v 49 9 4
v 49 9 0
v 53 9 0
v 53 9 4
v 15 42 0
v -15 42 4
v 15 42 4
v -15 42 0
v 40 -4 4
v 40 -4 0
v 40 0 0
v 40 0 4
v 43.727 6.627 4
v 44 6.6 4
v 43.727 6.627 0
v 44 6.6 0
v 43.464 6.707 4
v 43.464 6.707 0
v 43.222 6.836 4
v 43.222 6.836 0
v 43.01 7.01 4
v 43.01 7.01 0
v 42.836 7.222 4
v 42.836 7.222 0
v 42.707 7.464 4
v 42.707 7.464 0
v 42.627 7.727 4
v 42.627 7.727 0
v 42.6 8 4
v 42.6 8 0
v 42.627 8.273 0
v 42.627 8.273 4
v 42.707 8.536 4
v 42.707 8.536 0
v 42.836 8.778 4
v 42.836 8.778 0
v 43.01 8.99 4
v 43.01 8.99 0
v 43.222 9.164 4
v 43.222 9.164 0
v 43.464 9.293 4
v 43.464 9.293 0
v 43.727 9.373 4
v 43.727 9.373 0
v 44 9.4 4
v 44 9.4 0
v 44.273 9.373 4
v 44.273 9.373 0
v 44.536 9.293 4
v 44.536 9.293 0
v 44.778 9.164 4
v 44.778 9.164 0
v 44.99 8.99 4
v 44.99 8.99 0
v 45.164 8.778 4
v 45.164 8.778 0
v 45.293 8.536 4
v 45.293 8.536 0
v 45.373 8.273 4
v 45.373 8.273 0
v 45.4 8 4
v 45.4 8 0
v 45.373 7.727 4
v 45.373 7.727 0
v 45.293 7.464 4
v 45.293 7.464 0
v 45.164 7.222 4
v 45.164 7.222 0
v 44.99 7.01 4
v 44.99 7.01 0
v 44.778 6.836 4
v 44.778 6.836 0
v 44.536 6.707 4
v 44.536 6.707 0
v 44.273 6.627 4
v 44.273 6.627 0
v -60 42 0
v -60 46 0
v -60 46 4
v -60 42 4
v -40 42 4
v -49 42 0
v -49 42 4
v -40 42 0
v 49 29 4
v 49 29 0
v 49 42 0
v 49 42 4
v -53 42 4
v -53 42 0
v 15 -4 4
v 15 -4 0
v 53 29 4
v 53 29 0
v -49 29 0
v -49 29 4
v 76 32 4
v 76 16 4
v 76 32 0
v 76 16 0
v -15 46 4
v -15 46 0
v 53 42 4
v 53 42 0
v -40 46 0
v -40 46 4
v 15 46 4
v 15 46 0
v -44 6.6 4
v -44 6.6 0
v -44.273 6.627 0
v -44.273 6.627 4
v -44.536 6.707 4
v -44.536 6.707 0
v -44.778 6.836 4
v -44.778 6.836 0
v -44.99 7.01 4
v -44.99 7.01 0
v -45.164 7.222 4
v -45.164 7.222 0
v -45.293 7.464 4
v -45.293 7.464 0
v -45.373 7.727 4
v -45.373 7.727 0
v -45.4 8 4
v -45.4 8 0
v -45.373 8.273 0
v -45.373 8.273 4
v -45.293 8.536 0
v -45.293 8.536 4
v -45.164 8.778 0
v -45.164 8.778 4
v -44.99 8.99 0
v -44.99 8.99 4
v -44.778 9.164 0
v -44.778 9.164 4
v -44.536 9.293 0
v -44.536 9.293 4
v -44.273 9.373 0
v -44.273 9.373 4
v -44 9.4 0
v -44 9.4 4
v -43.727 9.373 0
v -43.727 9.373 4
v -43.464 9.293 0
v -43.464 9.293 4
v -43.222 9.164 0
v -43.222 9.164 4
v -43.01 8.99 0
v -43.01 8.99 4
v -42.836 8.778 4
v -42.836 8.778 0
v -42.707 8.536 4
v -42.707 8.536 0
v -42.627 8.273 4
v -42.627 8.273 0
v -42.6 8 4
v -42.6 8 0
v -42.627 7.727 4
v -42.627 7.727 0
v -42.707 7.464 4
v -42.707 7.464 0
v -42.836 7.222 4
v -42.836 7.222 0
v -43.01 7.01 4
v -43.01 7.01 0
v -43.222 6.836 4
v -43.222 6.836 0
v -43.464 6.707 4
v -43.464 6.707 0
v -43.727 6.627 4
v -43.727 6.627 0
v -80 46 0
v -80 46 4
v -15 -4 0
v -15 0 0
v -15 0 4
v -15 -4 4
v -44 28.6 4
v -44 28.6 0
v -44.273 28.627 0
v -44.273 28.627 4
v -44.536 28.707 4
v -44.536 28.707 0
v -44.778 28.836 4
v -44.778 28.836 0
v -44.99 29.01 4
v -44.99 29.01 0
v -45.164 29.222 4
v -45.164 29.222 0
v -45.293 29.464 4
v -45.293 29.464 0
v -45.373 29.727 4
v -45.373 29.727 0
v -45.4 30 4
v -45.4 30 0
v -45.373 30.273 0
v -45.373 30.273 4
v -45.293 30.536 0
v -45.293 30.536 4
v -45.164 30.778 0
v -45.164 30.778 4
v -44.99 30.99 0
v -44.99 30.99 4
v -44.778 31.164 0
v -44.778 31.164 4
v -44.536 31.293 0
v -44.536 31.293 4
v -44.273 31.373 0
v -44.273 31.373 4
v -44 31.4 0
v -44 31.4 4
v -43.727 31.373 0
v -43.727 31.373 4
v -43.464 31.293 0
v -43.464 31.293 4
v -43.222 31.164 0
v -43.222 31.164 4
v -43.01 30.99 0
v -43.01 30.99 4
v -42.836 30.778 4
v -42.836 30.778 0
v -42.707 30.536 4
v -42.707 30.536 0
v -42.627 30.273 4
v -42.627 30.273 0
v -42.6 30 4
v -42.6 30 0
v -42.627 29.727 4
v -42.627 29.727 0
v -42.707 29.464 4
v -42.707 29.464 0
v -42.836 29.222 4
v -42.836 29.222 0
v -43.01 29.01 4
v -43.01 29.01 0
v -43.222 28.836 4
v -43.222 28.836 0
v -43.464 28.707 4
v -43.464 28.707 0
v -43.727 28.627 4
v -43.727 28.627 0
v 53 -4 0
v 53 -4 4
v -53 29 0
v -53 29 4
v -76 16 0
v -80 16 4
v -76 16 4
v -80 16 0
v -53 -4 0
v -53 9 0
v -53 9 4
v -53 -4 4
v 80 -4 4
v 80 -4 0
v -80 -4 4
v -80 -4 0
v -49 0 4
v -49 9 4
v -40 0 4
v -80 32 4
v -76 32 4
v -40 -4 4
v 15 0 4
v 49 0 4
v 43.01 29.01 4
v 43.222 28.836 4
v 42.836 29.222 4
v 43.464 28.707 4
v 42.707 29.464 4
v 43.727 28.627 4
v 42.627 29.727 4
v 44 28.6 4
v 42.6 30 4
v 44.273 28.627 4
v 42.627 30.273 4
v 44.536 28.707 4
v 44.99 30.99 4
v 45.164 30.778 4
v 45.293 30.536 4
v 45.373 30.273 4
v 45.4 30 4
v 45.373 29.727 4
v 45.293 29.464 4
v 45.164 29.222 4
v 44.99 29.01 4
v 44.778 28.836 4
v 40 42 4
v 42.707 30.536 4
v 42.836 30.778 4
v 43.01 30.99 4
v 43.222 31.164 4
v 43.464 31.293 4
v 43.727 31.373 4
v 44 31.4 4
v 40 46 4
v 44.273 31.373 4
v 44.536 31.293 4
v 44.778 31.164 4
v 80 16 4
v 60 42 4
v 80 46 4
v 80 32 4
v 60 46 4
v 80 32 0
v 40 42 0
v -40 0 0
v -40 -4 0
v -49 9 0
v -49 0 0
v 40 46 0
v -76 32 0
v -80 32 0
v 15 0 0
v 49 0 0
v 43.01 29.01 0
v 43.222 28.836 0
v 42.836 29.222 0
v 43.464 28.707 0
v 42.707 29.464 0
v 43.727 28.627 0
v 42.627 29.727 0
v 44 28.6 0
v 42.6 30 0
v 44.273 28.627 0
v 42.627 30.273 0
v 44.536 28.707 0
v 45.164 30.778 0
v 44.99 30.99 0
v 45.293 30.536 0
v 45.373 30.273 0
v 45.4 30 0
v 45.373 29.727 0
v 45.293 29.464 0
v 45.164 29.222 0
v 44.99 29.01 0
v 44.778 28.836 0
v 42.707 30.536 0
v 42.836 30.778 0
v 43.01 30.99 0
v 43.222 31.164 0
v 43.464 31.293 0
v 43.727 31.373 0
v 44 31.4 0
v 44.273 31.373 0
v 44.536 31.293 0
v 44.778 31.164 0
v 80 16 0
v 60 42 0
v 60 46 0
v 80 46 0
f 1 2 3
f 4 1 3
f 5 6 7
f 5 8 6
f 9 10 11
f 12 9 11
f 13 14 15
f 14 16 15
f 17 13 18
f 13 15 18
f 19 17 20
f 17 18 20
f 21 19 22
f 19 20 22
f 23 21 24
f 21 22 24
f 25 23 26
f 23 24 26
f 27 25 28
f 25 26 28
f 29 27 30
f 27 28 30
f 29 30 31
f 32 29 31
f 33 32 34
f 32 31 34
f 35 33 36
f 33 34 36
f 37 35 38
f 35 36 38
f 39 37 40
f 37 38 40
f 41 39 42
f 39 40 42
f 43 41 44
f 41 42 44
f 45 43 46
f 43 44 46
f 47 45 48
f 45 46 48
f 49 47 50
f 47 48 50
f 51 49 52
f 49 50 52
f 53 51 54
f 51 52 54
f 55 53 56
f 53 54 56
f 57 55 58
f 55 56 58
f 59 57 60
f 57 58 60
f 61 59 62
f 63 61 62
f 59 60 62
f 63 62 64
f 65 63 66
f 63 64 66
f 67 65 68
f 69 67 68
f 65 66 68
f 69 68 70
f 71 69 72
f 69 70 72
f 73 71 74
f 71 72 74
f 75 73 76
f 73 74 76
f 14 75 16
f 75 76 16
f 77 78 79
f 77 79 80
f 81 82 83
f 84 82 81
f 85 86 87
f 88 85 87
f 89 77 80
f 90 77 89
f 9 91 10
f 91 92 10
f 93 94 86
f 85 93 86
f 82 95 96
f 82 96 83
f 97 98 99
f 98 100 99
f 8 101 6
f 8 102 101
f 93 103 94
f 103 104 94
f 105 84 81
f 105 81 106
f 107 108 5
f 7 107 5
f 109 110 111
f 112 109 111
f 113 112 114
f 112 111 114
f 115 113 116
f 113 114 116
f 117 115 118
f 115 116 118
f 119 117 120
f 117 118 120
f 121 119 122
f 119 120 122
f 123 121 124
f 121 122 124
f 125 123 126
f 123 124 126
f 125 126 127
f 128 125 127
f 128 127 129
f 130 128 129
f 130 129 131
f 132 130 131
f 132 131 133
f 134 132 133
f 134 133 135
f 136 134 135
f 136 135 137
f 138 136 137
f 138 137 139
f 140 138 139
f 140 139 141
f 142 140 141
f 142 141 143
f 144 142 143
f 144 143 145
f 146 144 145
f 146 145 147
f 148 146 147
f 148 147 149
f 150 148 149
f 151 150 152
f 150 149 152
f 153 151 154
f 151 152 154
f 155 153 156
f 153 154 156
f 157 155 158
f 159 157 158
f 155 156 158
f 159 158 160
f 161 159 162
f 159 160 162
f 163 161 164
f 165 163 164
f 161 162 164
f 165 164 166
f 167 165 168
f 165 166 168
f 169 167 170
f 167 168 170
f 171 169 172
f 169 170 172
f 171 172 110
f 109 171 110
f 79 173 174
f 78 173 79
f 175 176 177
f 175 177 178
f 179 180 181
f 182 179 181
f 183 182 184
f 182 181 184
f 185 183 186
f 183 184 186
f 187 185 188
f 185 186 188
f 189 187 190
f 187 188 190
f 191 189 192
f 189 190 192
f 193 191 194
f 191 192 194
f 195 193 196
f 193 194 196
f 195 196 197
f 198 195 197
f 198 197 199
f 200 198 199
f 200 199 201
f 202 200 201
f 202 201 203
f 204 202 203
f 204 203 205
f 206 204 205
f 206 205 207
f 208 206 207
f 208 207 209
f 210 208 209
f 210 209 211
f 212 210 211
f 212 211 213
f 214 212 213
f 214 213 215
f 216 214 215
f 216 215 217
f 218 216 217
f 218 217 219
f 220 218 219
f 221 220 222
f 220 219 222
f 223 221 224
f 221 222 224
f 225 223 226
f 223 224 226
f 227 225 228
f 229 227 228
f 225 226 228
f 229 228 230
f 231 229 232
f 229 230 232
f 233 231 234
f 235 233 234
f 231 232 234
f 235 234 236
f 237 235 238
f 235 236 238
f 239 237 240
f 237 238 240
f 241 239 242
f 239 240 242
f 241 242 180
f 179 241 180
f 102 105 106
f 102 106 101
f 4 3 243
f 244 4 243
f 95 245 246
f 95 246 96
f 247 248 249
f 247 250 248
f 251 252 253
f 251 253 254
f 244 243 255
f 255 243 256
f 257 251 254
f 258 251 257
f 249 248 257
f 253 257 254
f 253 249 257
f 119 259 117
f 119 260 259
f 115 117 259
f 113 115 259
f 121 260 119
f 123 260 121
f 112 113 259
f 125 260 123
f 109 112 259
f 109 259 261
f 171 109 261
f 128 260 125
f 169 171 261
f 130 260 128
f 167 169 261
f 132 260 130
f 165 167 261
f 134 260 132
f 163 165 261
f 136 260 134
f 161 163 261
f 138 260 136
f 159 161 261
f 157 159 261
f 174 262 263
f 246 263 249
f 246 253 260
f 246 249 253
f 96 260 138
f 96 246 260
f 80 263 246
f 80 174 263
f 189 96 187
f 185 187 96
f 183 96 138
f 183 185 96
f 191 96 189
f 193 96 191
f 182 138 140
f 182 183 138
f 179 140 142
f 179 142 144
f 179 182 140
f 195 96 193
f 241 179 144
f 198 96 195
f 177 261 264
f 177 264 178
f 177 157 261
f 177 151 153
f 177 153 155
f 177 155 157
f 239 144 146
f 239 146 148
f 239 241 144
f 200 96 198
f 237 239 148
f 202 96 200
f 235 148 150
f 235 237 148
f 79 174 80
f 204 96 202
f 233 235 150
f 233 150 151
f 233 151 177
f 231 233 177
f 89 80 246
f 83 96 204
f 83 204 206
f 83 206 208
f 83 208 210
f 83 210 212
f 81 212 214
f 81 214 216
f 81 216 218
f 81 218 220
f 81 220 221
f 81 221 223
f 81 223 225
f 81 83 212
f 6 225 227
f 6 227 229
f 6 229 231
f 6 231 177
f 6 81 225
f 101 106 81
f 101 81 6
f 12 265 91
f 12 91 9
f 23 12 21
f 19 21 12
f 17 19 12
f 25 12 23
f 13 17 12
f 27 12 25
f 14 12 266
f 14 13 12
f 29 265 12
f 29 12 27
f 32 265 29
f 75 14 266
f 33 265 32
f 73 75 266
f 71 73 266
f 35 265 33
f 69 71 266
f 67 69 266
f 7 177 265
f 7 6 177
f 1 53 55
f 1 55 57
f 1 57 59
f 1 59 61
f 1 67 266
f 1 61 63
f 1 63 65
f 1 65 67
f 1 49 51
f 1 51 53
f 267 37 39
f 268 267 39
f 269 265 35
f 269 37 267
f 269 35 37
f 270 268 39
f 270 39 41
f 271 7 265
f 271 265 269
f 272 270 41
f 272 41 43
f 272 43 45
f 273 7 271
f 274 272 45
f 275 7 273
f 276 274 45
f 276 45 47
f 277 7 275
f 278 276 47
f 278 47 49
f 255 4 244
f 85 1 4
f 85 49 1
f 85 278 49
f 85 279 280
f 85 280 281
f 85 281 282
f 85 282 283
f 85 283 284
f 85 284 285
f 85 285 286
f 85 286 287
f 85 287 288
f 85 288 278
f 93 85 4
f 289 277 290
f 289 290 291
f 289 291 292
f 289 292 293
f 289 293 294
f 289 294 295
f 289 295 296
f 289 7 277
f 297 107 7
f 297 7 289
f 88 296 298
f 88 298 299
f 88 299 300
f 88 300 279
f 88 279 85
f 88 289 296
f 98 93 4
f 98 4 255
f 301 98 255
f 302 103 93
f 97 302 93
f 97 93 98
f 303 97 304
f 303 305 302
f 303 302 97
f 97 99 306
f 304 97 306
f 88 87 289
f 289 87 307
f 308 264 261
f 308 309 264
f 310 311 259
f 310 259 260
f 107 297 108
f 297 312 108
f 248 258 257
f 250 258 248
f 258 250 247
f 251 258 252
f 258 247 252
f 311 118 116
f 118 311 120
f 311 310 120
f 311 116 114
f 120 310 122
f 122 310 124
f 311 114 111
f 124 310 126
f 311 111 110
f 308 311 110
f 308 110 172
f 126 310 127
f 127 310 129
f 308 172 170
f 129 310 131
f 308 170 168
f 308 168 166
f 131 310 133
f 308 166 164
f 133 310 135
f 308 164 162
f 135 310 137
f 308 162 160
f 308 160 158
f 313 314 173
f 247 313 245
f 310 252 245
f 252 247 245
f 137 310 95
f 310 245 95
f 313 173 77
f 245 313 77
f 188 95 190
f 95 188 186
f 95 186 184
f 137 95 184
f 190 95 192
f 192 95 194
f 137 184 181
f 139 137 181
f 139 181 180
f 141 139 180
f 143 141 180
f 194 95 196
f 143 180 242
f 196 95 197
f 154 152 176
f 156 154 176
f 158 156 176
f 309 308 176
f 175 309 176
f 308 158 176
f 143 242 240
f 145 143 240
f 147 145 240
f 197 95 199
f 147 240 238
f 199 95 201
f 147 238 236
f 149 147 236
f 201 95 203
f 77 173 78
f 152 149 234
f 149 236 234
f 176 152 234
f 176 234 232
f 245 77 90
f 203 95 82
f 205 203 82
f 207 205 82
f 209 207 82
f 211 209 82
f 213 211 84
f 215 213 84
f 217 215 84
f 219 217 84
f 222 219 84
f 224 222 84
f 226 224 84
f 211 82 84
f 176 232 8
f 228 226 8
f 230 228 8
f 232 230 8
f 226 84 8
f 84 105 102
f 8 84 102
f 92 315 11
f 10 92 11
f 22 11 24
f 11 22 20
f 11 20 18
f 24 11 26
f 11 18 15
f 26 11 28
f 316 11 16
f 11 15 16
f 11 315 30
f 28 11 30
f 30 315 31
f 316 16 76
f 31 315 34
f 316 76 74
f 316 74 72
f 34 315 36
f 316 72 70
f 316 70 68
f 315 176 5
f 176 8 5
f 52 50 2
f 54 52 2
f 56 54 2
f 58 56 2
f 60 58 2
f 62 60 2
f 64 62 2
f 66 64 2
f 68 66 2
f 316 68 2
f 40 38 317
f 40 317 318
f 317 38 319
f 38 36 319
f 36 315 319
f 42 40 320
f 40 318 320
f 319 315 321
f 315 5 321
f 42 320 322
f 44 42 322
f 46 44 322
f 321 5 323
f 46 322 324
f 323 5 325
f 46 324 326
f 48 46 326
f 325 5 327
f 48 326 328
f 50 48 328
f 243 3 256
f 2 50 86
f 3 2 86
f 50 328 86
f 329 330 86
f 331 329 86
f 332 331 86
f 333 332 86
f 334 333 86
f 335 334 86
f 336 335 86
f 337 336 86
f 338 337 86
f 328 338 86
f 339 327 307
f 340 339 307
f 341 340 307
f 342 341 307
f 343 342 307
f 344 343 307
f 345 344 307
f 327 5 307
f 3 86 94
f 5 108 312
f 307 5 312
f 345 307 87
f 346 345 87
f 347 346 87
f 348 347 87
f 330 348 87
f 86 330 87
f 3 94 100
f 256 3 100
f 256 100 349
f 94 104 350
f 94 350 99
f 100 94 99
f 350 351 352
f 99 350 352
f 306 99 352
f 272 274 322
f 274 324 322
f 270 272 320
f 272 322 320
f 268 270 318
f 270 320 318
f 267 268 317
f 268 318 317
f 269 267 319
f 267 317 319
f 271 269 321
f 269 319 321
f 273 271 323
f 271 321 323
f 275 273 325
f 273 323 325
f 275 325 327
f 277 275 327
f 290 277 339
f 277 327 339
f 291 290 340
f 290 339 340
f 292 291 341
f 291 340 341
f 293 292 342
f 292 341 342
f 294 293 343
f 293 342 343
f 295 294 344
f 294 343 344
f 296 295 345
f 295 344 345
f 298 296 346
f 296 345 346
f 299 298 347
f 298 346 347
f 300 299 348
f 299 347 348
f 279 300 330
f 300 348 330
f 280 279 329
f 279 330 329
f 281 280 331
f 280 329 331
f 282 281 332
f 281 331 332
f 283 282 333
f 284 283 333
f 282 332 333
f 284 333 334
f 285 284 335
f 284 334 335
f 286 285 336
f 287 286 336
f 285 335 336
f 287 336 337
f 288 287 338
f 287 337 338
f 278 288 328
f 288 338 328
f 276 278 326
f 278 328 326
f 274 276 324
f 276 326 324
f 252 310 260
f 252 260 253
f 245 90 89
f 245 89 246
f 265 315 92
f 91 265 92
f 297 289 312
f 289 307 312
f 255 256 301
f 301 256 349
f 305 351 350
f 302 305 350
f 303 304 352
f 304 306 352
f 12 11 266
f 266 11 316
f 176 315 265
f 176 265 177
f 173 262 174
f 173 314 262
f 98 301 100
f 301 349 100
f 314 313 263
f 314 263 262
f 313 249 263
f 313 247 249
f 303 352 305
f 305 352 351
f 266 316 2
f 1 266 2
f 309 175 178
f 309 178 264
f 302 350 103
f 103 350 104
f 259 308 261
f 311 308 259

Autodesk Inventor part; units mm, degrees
ref_plane "YZ Plane" through (0, 0, 0) normal (1, 0, 0) x (0, 1, 0)
ref_plane "XZ Plane" through (0, 0, 0) normal (0, 1, 0) x (-1, 0, 0)
ref_plane "XY Plane" through (0, 0, 0) normal (0, 0, 1) x (1, 0, 0)
sketch "Эскиз1" plane through (0, 0, 0) normal (0, 0, 1) x (1, 0, 0)
  line L0 (0, 0) -> (-15, 0)
  line L1 (-15, 0) -> (-15, -4)
  line L2 (-15, -4) -> (-40, -4)
  line L3 (-40, -4) -> (-40, 0)
  line L4 (-40, 0) -> (-49, 0)
  line L5 (-49, 0) -> (-49, 9)
  line L6 (-49, 9) -> (-53, 9)
  line L7 (-53, 9) -> (-53, -4)
  line L8 (-53, -4) -> (-80, -4)
  line L9 (-80, 46) -> (-60, 46)
  line L10 (-60, 46) -> (-60, 42)
  line L11 (-60, 42) -> (-53, 42)
  line L12 (-53, 42) -> (-53, 29)
  line L13 (-53, 29) -> (-49, 29)
  line L14 (-49, 29) -> (-49, 42)
  line L15 (-49, 42) -> (-40, 42)
  line L16 (-40, 42) -> (-40, 46)
  line L17 (-40, 46) -> (-15, 46)
  line L18 (-15, 46) -> (-15, 42)
  line L19 (-15, 42) -> (0, 42)
  line L20 (0, 42) -> (0, 0)
  line L21 (0, 0) -> (15, 0)
  line L22 (15, 0) -> (15, -4)
  line L23 (15, -4) -> (40, -4)
  line L24 (40, -4) -> (40, 0)
  line L25 (40, 0) -> (49, 0)
  line L26 (49, 0) -> (49, 9)
  line L27 (49, 9) -> (53, 9)
  line L28 (53, 9) -> (53, -4)
  line L29 (53, -4) -> (80, -4)
  line L30 (80, 46) -> (60, 46)
  line L31 (60, 46) -> (60, 42)
  line L32 (60, 42) -> (53, 42)
  line L33 (53, 42) -> (53, 29)
  line L34 (53, 29) -> (49, 29)
  line L35 (49, 29) -> (49, 42)
  line L36 (49, 42) -> (40, 42)
  line L37 (40, 42) -> (40, 46)
  line L38 (40, 46) -> (15, 46)
  line L39 (15, 46) -> (15, 42)
  line L40 (15, 42) -> (0, 42)
  line L41 (-80, -4) -> (-80, 16)
  line L42 (-80, 16) -> (-76, 16)
  line L43 (-76, 16) -> (-76, 32)
  line L44 (-76, 32) -> (-80, 32)
  line L45 (-80, 32) -> (-80, 46)
  line L46 (80, -4) -> (80, 16)
  line L47 (76, 16) -> (76, 32)
  line L48 (76, 32) -> (80, 32)
  line L49 (80, 16) -> (76, 16)
  line L50 (80, 32) -> (80, 46)
  dimension "d0" = 4
  dimension "d1" = 30
  dimension "d2" = 25
  dimension "d3" = 9
  dimension "d4" = 20
  dimension "d5" = 13
  dimension "d6" = 17
  dimension "d9" = 25
  dimension "d12" = 20
  dimension "d13" = 27
  dimension "d14" = 16
  dimension "d15" = 14
extrude "Выдавливание1" add sketch "Эскиз1" along normal blind 4
sketch "Эскиз3" plane through (0, 0, 4) normal (0, 0, 1) x (1, 0, 0)
  line L0 (0, 0) -> (0, 42)
  line L1 (15, 42) -> (-15, 42) projected
  line L2 (-40, 42) -> (-49, 42) projected
  line L3 (-49, 42) -> (-49, 29) projected
  point P0 (-44, 30)
  point P1 (-44, 8)
  point P2 (44, 8)
  point P3 (44, 30)
  dimension "d28" = 12
  dimension "d29" = 34
  dimension "d30" = 5
hole "Отверстие1" at (-44, 30, 4) at (-44, 8, 4) at (44, 8, 4) at (44, 30, 4) direction (0, 0, -1) diameter 2.8 end through all
properties part number "back" material "Дерево (береза)"
